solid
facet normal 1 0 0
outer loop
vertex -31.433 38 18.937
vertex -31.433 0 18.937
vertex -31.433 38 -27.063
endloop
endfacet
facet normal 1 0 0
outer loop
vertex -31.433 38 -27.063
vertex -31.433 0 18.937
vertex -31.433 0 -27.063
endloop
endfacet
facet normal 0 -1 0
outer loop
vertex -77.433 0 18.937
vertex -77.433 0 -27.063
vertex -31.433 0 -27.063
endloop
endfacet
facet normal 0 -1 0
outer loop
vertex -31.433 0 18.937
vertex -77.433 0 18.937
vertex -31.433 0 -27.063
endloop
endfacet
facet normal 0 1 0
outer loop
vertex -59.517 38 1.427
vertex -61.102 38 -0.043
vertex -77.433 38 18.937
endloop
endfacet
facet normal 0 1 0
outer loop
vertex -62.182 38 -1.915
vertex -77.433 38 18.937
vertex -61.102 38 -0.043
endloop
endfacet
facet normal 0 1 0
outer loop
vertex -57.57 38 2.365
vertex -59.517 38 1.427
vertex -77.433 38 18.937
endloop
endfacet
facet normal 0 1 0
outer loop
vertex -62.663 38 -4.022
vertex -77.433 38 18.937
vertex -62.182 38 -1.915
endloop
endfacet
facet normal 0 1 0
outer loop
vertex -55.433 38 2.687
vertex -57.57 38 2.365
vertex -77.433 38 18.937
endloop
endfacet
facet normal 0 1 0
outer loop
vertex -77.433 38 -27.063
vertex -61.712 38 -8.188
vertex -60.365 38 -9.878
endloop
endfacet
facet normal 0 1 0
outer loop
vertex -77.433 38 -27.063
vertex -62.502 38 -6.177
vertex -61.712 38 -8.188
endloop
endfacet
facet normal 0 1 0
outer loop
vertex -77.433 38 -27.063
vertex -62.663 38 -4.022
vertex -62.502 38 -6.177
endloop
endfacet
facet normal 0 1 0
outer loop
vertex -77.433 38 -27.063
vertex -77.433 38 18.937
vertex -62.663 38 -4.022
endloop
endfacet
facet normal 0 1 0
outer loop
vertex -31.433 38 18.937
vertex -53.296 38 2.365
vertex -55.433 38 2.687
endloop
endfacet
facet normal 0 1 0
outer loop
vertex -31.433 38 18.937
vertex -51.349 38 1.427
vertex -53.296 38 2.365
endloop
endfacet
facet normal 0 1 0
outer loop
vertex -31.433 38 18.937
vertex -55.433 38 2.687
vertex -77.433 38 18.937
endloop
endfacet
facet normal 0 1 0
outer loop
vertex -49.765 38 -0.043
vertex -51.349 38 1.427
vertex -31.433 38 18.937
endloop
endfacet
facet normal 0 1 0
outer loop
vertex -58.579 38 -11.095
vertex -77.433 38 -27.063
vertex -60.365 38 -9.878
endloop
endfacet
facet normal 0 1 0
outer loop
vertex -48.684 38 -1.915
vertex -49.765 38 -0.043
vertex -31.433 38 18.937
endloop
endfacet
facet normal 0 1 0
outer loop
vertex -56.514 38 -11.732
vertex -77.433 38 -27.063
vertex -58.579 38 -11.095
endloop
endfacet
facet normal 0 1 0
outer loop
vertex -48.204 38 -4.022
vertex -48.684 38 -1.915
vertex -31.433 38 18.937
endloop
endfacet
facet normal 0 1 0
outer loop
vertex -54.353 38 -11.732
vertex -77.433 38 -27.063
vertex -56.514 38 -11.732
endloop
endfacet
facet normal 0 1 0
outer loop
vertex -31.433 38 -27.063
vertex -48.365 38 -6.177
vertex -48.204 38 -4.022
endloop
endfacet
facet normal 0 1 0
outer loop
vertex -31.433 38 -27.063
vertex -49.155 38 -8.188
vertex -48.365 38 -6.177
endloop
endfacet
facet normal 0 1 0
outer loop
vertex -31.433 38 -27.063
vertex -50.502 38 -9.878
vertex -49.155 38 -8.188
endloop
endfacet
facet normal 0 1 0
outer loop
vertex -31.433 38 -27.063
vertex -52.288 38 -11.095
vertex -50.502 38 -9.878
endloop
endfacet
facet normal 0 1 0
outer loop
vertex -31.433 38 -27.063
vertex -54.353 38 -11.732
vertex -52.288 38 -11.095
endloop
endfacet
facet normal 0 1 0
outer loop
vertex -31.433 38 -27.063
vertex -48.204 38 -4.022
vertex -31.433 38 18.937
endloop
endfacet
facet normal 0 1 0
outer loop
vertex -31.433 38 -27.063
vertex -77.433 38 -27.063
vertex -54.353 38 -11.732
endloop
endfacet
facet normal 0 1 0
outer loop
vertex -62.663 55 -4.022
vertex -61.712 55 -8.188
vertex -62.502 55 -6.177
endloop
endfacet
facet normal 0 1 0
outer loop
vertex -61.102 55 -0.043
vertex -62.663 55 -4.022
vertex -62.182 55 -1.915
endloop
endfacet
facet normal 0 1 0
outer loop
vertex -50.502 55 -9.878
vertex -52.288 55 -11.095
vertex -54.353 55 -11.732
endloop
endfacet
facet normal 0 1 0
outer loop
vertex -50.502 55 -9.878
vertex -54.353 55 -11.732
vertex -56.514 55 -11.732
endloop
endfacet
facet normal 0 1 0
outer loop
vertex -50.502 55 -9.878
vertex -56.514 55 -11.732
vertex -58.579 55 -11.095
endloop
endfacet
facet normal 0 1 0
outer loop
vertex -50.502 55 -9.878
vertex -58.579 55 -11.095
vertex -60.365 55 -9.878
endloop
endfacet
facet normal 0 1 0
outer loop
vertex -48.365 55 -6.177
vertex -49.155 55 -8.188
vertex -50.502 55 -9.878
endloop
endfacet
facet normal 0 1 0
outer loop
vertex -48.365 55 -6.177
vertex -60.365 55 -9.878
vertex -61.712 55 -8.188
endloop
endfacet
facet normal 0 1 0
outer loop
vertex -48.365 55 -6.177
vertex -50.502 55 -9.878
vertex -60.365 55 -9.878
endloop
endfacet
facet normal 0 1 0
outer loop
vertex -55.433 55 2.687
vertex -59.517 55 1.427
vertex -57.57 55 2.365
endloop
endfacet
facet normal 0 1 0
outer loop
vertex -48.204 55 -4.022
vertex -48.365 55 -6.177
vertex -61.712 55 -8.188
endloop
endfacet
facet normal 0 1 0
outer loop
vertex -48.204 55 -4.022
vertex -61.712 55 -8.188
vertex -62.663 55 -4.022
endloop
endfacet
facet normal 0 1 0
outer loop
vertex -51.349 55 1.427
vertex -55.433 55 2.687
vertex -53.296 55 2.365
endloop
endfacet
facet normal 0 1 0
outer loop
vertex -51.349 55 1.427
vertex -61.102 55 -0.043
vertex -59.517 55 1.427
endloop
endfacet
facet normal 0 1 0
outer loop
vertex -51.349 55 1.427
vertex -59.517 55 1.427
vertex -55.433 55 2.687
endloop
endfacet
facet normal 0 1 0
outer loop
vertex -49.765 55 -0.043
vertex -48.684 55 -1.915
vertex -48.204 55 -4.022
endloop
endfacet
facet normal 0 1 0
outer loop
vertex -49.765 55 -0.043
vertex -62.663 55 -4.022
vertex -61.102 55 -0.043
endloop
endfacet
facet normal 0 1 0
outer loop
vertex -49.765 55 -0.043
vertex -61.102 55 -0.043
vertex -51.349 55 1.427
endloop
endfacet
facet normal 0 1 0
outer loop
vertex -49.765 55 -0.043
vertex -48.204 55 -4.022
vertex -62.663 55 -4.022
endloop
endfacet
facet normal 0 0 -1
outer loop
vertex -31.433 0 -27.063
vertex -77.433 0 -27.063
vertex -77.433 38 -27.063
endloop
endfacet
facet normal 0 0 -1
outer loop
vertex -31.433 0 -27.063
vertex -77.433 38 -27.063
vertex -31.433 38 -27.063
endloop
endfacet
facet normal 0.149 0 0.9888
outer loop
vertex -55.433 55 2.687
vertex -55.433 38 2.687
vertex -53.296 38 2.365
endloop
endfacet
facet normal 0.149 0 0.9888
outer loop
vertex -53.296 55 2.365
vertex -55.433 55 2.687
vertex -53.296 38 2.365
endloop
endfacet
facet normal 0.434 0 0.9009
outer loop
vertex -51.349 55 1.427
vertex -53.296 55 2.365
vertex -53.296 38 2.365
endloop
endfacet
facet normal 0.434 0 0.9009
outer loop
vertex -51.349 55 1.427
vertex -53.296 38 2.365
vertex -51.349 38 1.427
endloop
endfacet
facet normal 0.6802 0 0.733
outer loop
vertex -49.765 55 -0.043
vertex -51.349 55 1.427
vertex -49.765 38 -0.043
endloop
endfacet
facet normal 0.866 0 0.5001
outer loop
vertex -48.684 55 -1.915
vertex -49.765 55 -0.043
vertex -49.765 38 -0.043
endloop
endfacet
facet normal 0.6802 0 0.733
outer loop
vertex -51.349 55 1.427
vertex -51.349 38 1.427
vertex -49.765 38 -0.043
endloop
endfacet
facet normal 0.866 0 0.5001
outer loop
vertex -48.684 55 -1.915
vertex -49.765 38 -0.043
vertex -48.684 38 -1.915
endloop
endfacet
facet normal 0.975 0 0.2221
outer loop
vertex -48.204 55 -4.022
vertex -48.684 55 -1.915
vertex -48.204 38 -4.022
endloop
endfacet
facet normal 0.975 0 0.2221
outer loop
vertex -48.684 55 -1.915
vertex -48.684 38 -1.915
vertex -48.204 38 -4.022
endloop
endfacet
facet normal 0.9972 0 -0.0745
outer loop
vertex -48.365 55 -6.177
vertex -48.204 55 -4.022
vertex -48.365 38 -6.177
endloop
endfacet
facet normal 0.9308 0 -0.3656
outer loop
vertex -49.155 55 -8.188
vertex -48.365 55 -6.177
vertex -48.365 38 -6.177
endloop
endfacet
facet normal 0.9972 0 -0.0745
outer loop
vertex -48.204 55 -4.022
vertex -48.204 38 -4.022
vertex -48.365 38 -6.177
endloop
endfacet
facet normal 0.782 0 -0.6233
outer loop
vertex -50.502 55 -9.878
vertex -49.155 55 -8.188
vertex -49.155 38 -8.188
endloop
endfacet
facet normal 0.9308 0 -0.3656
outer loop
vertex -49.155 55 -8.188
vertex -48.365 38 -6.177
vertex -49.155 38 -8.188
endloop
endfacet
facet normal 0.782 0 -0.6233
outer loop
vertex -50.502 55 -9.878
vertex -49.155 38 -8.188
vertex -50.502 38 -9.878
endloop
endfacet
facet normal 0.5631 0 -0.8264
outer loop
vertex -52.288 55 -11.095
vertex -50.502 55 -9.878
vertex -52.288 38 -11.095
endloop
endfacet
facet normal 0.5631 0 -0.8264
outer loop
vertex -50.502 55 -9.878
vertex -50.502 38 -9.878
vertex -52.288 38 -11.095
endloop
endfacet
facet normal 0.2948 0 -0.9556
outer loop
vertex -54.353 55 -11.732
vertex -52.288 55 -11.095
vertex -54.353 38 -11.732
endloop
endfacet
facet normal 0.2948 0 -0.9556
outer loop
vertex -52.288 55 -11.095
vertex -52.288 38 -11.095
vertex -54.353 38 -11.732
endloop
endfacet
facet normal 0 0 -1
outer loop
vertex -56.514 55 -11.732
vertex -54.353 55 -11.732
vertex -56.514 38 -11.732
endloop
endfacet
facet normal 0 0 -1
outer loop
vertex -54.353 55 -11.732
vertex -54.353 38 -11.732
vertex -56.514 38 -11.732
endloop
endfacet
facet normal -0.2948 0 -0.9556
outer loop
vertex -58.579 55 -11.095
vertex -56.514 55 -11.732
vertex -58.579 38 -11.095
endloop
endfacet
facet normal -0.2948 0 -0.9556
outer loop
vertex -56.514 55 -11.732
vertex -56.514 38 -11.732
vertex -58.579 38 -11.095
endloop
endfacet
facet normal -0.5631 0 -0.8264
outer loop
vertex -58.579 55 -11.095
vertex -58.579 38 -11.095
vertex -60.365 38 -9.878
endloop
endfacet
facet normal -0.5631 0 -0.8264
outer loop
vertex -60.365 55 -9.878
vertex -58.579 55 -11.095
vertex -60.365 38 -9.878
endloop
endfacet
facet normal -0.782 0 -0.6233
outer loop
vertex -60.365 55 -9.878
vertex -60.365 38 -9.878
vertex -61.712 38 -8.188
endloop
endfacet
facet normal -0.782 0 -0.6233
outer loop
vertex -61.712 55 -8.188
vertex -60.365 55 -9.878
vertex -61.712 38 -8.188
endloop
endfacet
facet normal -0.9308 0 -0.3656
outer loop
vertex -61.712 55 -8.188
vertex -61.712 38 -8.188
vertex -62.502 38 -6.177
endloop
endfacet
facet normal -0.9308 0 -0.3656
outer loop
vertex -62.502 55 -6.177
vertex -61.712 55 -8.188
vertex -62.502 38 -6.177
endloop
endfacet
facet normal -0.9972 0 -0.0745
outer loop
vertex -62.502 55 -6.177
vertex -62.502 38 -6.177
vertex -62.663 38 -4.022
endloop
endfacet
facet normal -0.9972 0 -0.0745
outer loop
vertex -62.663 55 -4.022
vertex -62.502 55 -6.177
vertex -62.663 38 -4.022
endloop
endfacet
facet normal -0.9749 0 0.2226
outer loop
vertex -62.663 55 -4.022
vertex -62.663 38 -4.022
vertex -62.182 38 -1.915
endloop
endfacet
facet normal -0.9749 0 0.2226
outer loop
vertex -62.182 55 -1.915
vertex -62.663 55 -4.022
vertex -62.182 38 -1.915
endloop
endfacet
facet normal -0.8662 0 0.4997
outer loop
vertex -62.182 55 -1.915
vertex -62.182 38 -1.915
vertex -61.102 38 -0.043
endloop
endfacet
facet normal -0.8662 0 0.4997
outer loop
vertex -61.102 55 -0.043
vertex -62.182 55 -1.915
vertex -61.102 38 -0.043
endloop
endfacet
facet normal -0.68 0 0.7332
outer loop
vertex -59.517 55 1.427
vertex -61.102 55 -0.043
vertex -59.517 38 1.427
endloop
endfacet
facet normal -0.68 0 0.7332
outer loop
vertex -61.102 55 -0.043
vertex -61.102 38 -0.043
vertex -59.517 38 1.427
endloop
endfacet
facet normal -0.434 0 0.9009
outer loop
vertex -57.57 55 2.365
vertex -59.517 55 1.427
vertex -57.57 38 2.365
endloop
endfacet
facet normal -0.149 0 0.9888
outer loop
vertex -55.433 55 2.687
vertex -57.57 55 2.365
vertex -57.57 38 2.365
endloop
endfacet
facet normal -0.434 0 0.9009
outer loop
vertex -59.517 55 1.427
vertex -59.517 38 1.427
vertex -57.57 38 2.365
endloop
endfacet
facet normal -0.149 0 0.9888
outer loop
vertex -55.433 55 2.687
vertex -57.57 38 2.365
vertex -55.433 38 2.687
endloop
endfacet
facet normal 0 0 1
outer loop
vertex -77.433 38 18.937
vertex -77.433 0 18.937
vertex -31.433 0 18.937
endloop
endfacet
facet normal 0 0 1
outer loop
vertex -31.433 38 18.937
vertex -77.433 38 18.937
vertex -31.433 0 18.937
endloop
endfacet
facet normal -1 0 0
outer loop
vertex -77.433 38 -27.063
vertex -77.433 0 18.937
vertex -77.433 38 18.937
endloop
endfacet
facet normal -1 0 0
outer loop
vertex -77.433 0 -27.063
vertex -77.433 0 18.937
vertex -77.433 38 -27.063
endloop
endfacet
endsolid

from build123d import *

# Parameters (mm, degrees)
ESQUISSE1_W        = 46
ESQUISSE1_H        = 46
BOSS_EXTRU_1_DEPTH = 38
ESQUISSE2_R        = 7.25
BOSS_EXTRU_2_DEPTH = 17


with BuildPart() as part:
    # Esquisse1 → Boss.-Extru.1 (new body)
    with BuildSketch(Plane(origin=(0, 0, 0), x_dir=(1, 0, 0), z_dir=(0, 1, 0))):
        with Locations((-54.433333333, 4.063333333)):
            Rectangle(ESQUISSE1_W, ESQUISSE1_H)
    extrude(amount=BOSS_EXTRU_1_DEPTH)

    # Esquisse2 → Boss.-Extru.2 (add)
    with BuildSketch(Plane(origin=(0, 38, 0), x_dir=(1, 0, 0), z_dir=(0, 1, 0))):
        with Locations(Location((-55.433333333, 4.563333333, 0), (0, 0, 270))):
            Circle(ESQUISSE2_R)
    extrude(amount=BOSS_EXTRU_2_DEPTH)


solid = part.part
